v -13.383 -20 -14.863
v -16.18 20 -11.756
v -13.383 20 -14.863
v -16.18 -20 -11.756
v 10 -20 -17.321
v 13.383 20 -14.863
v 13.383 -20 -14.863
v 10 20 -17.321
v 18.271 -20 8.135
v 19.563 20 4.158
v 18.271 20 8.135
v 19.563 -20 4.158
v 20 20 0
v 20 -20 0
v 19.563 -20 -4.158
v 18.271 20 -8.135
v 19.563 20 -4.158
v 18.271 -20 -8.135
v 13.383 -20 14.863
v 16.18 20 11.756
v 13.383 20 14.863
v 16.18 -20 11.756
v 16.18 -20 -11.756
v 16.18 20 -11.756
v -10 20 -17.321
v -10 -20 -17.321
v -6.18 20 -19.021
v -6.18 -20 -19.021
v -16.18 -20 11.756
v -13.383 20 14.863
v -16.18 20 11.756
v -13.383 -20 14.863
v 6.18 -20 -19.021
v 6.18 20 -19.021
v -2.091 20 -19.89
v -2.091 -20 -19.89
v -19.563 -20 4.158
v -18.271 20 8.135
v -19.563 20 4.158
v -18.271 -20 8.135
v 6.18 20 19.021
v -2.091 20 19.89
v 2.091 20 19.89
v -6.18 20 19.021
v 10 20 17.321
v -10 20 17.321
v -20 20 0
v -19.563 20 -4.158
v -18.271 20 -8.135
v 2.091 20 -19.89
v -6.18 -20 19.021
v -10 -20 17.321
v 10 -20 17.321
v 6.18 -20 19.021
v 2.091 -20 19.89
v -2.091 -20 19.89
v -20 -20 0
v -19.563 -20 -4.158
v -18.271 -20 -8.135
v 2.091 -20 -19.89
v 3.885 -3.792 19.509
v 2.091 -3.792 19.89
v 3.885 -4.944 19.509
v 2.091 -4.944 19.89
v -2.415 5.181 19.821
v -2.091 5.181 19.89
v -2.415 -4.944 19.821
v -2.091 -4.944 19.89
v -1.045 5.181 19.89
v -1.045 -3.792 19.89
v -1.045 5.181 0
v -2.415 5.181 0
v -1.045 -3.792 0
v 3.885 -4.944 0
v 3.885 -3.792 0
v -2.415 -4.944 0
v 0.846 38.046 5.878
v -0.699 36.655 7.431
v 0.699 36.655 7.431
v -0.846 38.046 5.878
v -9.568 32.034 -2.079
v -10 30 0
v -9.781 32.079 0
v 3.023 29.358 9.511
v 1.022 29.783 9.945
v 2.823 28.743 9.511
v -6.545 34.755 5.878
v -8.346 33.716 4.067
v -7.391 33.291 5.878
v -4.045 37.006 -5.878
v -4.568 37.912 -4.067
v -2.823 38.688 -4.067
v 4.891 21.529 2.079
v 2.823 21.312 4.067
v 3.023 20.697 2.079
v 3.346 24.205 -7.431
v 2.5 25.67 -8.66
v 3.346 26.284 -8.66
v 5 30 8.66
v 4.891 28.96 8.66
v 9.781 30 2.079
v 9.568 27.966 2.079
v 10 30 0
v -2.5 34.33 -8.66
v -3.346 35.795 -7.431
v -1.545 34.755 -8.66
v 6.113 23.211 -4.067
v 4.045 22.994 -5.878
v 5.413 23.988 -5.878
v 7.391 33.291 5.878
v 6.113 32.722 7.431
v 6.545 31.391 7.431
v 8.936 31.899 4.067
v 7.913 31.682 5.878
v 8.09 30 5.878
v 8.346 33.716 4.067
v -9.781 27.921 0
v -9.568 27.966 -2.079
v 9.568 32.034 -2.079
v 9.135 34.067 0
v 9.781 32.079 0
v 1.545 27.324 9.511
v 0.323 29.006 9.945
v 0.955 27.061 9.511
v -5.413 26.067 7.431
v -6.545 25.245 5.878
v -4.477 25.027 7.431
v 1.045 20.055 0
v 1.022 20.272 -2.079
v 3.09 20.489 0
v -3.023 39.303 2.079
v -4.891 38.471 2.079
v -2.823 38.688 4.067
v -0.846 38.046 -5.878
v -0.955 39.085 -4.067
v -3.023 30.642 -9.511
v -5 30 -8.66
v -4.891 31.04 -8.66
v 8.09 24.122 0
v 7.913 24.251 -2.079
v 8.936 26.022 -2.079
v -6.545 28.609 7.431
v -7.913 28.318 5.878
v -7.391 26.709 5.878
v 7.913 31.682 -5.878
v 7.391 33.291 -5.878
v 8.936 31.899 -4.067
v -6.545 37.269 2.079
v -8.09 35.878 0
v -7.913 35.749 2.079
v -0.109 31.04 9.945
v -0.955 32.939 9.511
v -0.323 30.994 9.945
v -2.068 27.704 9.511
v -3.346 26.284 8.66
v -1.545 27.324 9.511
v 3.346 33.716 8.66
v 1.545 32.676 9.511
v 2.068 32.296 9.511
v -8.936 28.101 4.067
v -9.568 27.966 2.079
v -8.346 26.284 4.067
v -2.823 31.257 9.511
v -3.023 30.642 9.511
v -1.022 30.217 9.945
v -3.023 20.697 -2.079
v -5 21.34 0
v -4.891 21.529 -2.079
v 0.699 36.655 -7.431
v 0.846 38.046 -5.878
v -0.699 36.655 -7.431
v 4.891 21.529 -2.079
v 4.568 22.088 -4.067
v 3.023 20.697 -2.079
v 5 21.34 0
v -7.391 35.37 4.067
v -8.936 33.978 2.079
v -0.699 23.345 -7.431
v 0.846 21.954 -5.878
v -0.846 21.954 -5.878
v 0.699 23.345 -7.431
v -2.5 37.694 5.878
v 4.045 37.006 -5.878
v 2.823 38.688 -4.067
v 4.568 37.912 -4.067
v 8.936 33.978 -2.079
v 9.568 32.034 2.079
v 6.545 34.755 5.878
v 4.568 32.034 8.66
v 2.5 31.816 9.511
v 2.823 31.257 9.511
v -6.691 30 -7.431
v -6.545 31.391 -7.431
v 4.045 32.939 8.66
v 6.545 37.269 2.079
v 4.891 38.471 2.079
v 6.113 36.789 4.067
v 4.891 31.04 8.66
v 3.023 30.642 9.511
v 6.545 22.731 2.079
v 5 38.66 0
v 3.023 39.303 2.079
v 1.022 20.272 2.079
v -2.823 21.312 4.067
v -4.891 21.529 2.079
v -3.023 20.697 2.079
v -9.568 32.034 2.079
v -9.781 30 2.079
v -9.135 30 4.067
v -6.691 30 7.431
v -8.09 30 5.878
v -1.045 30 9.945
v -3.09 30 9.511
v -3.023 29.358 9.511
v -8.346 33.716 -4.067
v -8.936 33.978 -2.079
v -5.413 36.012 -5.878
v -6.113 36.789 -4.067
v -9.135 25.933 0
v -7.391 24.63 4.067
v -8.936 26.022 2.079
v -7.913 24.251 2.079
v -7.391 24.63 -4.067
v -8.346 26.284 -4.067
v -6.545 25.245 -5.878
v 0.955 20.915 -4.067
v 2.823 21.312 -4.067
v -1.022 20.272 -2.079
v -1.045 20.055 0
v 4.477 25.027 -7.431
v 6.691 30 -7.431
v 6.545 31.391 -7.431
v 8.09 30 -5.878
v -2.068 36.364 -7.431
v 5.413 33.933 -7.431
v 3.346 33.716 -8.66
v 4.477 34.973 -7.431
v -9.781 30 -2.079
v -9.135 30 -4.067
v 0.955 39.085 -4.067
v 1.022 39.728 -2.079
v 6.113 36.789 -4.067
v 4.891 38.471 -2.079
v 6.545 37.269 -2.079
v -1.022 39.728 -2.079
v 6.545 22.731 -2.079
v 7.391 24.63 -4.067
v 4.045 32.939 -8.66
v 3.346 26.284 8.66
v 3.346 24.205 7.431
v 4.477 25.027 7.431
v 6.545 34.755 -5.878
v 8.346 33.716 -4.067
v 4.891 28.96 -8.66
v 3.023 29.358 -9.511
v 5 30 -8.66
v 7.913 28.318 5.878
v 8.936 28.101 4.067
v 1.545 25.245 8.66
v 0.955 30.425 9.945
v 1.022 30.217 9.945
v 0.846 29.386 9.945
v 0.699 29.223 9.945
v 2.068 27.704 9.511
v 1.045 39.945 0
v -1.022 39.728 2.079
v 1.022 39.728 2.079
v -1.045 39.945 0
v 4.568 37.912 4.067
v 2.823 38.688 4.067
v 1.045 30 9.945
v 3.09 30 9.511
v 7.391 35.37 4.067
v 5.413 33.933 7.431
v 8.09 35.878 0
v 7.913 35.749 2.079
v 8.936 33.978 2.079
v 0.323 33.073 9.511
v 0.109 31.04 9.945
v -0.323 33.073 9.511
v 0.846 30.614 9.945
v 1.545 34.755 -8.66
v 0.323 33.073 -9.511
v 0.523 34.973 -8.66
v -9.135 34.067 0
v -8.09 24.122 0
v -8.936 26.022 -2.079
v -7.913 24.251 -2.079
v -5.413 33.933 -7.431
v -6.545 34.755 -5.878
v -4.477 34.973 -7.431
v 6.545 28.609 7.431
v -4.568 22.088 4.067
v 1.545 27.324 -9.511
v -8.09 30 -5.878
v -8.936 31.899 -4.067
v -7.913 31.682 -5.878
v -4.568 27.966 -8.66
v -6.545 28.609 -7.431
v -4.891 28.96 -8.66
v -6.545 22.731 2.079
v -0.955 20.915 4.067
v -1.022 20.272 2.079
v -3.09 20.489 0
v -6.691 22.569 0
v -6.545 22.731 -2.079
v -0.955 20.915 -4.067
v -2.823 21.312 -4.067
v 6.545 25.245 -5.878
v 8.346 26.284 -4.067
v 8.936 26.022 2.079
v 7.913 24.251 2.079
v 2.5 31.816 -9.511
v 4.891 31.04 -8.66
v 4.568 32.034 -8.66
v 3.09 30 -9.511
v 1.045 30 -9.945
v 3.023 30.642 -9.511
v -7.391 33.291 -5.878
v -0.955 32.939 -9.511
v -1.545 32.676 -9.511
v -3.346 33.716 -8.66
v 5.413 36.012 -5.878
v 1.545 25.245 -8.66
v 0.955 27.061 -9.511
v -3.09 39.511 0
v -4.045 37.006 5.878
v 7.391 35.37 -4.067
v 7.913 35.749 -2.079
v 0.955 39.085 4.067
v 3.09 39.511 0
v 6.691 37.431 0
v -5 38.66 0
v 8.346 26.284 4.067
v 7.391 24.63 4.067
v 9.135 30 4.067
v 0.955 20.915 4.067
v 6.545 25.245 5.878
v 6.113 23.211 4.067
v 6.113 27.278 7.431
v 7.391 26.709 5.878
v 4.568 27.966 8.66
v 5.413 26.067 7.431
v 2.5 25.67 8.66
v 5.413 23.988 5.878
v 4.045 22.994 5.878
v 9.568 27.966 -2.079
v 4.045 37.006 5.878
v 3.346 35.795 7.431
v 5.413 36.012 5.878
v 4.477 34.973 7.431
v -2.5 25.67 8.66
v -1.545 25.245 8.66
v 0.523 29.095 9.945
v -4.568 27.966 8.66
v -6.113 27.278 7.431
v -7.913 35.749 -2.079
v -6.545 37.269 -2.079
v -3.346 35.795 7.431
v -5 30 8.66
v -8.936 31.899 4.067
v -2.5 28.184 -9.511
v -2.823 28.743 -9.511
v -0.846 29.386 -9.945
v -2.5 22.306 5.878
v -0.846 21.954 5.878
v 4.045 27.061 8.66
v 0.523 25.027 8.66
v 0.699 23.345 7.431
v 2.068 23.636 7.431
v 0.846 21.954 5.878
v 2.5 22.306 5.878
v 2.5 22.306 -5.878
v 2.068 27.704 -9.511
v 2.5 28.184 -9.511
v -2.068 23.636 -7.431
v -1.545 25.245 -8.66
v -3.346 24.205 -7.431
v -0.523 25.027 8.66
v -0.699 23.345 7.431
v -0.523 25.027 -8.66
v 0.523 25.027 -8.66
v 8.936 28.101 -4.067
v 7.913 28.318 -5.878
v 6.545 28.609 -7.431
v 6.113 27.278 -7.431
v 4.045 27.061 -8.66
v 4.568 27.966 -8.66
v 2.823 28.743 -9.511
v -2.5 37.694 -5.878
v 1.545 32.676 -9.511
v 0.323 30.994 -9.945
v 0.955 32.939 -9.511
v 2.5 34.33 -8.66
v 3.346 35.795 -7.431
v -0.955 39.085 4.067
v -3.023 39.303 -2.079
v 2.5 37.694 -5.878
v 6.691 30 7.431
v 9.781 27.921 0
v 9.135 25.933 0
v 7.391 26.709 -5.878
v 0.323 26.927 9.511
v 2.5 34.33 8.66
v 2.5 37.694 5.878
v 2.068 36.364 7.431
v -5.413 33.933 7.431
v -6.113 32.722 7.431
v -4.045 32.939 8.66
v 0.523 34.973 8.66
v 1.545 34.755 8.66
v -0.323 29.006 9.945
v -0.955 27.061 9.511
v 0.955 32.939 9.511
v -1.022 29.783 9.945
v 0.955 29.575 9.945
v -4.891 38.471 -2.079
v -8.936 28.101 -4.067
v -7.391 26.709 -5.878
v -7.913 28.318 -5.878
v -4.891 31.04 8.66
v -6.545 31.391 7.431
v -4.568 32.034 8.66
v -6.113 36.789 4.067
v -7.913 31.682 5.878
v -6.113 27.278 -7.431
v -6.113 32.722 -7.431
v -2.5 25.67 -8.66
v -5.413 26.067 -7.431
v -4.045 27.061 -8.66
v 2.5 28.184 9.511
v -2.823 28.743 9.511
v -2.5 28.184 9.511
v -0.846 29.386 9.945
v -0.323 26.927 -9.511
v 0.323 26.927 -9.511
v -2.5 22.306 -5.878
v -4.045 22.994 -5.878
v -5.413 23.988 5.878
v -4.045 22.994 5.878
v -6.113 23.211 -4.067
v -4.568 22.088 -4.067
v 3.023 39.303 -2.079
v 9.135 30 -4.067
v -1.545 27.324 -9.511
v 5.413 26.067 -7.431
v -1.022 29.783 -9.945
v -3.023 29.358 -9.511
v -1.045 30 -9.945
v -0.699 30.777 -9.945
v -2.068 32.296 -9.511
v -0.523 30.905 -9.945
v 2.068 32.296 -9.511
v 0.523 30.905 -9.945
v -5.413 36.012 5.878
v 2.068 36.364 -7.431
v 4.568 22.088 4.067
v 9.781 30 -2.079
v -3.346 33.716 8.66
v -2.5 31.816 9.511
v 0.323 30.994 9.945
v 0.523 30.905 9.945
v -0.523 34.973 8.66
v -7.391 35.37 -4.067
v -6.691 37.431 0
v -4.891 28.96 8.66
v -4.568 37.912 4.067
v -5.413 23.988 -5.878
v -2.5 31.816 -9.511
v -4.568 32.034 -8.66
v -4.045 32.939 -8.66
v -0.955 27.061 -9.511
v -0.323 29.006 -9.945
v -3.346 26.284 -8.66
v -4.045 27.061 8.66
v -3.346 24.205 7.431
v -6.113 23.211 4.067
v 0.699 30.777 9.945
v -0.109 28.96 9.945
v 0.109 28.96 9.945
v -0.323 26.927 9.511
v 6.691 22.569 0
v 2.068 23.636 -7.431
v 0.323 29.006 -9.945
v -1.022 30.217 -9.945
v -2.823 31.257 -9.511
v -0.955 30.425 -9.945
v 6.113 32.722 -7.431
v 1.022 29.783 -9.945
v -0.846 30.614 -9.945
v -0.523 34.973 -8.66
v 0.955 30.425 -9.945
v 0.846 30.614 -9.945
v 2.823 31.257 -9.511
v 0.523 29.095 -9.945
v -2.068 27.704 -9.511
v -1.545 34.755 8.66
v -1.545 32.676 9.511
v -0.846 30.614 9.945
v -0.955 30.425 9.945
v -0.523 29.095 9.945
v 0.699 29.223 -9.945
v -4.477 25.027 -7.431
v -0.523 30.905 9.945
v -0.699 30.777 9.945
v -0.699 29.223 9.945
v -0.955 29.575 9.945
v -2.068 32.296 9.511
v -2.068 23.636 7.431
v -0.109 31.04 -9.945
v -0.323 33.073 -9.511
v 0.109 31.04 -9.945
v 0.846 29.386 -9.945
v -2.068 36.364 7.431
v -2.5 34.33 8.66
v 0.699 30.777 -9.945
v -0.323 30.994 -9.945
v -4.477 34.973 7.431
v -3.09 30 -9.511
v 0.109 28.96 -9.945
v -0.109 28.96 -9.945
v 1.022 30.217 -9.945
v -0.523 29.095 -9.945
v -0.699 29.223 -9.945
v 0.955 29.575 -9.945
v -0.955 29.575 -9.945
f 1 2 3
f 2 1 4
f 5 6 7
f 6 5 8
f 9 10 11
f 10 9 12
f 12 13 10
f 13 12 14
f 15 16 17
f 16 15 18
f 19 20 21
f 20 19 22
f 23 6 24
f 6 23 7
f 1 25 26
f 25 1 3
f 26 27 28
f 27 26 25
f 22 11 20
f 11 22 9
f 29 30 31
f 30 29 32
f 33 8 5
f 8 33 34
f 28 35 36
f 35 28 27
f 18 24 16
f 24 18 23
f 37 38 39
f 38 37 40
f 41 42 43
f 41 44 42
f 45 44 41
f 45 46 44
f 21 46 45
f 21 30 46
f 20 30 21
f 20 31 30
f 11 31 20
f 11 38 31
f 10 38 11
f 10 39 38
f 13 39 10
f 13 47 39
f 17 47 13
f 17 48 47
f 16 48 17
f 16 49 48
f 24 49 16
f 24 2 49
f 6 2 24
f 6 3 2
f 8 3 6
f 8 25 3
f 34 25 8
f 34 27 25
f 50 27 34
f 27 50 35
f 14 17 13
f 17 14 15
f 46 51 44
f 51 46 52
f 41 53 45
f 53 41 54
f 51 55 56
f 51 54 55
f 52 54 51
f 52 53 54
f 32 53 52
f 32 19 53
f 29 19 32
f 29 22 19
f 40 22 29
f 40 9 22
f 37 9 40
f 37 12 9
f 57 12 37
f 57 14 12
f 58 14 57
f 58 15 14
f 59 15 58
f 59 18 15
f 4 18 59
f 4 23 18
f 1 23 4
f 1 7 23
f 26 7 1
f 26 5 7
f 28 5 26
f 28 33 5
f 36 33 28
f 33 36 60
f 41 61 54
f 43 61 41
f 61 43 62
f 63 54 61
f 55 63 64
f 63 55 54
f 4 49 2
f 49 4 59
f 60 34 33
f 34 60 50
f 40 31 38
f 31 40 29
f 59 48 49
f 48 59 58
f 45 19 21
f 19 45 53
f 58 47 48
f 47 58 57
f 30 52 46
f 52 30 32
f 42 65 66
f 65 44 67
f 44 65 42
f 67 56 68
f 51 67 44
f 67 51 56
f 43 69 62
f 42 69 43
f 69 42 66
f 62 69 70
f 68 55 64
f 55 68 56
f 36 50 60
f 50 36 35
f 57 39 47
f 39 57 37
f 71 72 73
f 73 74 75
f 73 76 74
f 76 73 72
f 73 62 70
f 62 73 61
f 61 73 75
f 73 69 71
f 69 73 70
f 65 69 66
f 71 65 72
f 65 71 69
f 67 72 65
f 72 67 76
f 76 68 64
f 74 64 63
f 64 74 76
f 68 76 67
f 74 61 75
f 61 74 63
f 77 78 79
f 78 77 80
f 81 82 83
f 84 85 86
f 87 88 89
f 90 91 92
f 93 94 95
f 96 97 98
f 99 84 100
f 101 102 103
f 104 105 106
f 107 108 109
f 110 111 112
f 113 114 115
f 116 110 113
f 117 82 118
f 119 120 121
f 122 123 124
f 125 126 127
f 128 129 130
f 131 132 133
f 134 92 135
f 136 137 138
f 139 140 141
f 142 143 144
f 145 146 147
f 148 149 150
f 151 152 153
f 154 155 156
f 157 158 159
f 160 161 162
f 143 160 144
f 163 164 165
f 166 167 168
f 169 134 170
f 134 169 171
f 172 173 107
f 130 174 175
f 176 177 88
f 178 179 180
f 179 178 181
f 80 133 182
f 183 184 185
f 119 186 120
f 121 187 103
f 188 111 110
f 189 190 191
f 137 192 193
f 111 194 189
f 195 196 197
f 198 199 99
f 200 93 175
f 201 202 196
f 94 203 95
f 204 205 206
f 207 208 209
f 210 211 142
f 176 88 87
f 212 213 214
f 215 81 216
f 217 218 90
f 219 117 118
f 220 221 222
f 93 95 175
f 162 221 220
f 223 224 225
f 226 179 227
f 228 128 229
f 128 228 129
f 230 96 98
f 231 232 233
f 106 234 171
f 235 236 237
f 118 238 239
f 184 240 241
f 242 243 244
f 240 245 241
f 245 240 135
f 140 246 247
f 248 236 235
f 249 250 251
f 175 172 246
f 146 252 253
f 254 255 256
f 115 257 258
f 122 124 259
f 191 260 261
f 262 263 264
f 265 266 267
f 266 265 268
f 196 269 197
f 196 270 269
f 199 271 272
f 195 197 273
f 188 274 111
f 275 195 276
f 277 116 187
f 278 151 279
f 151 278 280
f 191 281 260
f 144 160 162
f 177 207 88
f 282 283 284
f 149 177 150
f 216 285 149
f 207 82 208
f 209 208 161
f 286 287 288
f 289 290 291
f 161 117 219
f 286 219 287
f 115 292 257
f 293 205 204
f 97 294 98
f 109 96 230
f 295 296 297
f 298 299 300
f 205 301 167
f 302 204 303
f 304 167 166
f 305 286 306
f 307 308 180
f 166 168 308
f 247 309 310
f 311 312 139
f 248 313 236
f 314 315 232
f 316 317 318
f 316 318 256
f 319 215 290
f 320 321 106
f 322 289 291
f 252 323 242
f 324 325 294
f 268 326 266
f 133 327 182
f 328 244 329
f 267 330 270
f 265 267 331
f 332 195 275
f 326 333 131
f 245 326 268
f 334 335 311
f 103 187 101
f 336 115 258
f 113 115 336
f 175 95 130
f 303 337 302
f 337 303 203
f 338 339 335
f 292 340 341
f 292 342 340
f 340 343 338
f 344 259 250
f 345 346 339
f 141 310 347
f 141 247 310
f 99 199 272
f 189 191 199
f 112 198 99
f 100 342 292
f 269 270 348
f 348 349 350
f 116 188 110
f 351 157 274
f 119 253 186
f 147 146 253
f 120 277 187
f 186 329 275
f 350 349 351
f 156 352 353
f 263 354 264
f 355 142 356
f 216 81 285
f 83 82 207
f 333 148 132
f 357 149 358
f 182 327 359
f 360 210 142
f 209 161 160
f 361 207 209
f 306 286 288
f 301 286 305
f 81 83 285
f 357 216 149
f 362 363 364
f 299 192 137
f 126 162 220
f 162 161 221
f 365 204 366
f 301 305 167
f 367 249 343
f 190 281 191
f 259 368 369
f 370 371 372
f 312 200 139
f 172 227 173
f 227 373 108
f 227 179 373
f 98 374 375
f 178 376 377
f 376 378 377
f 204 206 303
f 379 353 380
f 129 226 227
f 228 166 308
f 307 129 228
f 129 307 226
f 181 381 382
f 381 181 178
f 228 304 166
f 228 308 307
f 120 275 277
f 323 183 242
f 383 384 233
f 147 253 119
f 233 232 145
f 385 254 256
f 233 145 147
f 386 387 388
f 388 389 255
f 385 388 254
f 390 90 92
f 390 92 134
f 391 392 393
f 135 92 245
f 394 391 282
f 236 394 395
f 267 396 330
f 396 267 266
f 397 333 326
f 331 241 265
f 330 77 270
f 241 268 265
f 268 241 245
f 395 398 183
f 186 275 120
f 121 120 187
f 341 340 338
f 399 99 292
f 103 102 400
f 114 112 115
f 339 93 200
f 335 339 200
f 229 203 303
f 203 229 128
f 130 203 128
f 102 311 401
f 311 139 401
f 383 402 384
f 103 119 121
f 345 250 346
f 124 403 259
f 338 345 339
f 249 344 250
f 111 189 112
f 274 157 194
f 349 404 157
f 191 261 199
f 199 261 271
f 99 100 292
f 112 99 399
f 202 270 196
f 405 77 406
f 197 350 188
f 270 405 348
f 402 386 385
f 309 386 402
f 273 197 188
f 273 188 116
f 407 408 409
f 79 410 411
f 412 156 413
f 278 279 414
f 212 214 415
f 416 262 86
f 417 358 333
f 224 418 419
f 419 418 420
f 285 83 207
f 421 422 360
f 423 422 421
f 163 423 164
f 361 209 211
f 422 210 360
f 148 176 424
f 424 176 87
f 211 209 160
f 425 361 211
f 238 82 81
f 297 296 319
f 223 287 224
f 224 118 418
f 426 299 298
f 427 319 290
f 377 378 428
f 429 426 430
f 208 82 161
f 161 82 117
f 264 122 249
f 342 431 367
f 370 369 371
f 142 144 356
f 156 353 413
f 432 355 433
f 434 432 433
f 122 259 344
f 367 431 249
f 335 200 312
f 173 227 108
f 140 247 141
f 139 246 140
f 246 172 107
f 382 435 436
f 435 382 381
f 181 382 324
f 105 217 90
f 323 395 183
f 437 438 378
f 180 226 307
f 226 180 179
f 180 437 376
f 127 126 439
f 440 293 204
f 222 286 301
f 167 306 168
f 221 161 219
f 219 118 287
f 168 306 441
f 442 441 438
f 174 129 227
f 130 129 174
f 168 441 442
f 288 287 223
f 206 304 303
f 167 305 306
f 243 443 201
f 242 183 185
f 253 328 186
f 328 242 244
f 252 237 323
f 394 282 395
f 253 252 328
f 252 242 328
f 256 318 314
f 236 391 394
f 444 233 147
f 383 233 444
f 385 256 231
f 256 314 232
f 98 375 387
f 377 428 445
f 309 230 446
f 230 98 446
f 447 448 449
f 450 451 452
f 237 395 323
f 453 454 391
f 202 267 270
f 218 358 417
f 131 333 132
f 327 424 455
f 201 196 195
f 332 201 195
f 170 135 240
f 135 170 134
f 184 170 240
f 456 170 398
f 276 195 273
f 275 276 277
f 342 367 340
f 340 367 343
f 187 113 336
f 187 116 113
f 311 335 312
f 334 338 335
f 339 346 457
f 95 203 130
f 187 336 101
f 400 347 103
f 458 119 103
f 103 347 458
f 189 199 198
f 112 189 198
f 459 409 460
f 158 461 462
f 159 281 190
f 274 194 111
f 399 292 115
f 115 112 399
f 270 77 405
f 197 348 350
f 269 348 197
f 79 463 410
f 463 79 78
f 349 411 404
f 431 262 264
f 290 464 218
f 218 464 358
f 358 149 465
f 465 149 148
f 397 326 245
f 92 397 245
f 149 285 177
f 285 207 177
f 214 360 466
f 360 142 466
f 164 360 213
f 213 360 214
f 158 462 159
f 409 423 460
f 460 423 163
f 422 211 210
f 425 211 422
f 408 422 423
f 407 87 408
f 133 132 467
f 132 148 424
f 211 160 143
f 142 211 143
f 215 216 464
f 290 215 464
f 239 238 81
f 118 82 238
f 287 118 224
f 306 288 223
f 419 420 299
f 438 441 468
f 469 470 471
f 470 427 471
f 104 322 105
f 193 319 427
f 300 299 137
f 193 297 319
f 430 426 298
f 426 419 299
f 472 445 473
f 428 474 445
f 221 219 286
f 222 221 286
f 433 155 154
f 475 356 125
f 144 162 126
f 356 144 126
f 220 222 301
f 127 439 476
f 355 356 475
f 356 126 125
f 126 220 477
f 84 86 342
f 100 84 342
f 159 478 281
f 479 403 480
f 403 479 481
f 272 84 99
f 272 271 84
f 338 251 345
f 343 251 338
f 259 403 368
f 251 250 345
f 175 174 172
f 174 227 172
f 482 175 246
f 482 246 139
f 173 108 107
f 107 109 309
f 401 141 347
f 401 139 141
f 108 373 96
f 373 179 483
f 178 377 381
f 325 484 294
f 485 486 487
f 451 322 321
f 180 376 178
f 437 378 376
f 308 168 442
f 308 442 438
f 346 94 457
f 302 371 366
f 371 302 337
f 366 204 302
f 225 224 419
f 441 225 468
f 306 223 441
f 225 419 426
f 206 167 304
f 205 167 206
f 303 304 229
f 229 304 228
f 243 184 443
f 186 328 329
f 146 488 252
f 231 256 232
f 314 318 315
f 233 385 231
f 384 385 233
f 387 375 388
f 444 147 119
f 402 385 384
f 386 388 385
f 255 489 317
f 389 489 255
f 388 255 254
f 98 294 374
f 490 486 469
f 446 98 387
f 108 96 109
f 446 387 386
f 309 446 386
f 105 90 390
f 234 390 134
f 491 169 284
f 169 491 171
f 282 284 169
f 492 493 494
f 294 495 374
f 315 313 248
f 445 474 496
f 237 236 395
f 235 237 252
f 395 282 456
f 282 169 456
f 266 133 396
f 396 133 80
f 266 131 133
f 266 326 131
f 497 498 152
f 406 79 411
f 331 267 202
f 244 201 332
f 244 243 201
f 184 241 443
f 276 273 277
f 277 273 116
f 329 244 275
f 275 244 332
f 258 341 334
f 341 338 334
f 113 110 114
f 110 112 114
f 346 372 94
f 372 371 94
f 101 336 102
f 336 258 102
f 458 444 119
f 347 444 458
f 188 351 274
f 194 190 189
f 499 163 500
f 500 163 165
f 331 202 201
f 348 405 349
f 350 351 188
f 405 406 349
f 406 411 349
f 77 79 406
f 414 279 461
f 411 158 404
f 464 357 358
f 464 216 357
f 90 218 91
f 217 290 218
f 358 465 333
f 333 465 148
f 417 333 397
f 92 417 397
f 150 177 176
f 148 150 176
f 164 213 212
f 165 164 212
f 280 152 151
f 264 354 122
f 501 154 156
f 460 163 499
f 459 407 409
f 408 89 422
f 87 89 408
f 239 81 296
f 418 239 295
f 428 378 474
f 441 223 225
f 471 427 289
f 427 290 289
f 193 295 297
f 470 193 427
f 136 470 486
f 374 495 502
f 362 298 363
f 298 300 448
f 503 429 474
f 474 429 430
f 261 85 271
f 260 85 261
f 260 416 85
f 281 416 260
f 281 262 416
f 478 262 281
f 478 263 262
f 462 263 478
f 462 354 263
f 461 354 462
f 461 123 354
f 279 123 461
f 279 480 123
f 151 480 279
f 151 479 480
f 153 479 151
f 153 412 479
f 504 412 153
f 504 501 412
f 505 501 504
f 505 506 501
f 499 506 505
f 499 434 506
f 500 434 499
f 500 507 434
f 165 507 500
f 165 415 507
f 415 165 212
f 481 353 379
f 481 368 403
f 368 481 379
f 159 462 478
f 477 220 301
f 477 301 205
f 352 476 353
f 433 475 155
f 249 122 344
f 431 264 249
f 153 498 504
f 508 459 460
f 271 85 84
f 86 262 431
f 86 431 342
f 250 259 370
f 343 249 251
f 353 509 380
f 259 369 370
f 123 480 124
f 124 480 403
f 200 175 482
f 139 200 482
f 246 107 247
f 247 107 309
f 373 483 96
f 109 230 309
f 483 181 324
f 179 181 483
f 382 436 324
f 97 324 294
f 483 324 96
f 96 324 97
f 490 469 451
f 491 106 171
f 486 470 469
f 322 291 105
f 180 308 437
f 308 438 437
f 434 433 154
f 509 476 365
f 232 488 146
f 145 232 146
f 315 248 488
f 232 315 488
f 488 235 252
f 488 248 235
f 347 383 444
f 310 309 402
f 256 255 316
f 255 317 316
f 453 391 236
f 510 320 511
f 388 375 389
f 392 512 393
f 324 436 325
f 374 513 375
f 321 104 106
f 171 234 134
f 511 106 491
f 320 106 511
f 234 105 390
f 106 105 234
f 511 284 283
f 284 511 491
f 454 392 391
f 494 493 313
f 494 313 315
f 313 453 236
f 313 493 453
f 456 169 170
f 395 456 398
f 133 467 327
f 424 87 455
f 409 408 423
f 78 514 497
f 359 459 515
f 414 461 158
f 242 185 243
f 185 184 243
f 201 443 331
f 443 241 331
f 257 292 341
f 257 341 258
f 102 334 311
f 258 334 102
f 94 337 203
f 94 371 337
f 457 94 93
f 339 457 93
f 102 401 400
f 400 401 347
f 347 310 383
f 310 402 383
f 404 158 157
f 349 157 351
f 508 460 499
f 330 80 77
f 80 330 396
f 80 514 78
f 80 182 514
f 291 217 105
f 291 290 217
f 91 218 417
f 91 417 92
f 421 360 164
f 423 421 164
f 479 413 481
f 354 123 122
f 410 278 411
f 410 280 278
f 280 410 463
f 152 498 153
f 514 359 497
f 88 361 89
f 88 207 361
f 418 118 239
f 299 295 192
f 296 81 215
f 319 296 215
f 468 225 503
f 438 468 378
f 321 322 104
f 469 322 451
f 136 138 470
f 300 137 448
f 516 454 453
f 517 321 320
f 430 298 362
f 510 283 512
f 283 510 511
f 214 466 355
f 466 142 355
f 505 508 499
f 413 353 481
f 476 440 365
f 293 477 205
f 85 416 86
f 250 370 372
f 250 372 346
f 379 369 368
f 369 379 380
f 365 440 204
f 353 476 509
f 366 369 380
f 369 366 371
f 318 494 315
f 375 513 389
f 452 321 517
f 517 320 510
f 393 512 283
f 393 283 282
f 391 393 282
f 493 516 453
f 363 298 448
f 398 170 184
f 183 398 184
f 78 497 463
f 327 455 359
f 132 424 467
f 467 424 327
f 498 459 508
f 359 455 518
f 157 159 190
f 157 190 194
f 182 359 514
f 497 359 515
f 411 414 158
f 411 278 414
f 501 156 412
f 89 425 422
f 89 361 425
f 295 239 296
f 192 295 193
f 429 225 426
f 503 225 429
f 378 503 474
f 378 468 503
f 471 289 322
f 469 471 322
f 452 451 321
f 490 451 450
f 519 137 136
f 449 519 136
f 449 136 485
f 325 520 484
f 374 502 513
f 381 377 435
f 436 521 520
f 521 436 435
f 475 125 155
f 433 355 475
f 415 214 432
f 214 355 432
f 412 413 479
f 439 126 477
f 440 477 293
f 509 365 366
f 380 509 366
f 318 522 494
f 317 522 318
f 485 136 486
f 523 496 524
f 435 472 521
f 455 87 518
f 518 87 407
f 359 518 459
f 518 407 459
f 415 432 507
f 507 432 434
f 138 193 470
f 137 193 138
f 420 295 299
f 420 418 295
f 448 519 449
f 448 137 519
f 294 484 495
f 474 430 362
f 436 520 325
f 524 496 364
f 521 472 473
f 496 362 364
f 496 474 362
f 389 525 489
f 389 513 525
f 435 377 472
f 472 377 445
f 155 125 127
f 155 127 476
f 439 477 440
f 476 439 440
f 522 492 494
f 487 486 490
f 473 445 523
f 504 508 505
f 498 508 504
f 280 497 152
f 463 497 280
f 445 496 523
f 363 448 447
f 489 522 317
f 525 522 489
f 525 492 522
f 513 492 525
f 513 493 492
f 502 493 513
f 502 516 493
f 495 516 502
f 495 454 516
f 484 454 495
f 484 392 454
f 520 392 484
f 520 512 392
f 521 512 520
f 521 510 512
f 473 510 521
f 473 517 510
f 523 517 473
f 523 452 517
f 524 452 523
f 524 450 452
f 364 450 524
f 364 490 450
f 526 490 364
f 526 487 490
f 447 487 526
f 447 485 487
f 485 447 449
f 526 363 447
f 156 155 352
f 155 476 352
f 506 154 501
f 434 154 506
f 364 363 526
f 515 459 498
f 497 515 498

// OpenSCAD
// 是否显示东西
show=true;

// 缩放
scale=1;

if (show)html();

module html(){
	union()
	{
		//"#" 让东西高亮
		#translate([0,30*scale,0]) head([0,0.3,0]);
		translate([0,0,0]) body();
	}
}

/**
*	c1: 头部颜色
*/
module head(c1){
	color(c1) sphere(10*scale);
}

module body(){
	difference() {
		rotate([90,0,0])cylinder(h=40*scale,r=20*scale, center=true);
		//加个文本
		linear_extrude(height=scale*20, convexity=1)	text("L", size=scale*10,font="Bitstream Vera Sans",		halign="center",valign="center");
	}
}

//translate([30,0,0])linear_extrude(height=10, convexity=0)	text("L", size=scale*10,font="Bitstream Vera Sans",		halign="center",valign="center");
